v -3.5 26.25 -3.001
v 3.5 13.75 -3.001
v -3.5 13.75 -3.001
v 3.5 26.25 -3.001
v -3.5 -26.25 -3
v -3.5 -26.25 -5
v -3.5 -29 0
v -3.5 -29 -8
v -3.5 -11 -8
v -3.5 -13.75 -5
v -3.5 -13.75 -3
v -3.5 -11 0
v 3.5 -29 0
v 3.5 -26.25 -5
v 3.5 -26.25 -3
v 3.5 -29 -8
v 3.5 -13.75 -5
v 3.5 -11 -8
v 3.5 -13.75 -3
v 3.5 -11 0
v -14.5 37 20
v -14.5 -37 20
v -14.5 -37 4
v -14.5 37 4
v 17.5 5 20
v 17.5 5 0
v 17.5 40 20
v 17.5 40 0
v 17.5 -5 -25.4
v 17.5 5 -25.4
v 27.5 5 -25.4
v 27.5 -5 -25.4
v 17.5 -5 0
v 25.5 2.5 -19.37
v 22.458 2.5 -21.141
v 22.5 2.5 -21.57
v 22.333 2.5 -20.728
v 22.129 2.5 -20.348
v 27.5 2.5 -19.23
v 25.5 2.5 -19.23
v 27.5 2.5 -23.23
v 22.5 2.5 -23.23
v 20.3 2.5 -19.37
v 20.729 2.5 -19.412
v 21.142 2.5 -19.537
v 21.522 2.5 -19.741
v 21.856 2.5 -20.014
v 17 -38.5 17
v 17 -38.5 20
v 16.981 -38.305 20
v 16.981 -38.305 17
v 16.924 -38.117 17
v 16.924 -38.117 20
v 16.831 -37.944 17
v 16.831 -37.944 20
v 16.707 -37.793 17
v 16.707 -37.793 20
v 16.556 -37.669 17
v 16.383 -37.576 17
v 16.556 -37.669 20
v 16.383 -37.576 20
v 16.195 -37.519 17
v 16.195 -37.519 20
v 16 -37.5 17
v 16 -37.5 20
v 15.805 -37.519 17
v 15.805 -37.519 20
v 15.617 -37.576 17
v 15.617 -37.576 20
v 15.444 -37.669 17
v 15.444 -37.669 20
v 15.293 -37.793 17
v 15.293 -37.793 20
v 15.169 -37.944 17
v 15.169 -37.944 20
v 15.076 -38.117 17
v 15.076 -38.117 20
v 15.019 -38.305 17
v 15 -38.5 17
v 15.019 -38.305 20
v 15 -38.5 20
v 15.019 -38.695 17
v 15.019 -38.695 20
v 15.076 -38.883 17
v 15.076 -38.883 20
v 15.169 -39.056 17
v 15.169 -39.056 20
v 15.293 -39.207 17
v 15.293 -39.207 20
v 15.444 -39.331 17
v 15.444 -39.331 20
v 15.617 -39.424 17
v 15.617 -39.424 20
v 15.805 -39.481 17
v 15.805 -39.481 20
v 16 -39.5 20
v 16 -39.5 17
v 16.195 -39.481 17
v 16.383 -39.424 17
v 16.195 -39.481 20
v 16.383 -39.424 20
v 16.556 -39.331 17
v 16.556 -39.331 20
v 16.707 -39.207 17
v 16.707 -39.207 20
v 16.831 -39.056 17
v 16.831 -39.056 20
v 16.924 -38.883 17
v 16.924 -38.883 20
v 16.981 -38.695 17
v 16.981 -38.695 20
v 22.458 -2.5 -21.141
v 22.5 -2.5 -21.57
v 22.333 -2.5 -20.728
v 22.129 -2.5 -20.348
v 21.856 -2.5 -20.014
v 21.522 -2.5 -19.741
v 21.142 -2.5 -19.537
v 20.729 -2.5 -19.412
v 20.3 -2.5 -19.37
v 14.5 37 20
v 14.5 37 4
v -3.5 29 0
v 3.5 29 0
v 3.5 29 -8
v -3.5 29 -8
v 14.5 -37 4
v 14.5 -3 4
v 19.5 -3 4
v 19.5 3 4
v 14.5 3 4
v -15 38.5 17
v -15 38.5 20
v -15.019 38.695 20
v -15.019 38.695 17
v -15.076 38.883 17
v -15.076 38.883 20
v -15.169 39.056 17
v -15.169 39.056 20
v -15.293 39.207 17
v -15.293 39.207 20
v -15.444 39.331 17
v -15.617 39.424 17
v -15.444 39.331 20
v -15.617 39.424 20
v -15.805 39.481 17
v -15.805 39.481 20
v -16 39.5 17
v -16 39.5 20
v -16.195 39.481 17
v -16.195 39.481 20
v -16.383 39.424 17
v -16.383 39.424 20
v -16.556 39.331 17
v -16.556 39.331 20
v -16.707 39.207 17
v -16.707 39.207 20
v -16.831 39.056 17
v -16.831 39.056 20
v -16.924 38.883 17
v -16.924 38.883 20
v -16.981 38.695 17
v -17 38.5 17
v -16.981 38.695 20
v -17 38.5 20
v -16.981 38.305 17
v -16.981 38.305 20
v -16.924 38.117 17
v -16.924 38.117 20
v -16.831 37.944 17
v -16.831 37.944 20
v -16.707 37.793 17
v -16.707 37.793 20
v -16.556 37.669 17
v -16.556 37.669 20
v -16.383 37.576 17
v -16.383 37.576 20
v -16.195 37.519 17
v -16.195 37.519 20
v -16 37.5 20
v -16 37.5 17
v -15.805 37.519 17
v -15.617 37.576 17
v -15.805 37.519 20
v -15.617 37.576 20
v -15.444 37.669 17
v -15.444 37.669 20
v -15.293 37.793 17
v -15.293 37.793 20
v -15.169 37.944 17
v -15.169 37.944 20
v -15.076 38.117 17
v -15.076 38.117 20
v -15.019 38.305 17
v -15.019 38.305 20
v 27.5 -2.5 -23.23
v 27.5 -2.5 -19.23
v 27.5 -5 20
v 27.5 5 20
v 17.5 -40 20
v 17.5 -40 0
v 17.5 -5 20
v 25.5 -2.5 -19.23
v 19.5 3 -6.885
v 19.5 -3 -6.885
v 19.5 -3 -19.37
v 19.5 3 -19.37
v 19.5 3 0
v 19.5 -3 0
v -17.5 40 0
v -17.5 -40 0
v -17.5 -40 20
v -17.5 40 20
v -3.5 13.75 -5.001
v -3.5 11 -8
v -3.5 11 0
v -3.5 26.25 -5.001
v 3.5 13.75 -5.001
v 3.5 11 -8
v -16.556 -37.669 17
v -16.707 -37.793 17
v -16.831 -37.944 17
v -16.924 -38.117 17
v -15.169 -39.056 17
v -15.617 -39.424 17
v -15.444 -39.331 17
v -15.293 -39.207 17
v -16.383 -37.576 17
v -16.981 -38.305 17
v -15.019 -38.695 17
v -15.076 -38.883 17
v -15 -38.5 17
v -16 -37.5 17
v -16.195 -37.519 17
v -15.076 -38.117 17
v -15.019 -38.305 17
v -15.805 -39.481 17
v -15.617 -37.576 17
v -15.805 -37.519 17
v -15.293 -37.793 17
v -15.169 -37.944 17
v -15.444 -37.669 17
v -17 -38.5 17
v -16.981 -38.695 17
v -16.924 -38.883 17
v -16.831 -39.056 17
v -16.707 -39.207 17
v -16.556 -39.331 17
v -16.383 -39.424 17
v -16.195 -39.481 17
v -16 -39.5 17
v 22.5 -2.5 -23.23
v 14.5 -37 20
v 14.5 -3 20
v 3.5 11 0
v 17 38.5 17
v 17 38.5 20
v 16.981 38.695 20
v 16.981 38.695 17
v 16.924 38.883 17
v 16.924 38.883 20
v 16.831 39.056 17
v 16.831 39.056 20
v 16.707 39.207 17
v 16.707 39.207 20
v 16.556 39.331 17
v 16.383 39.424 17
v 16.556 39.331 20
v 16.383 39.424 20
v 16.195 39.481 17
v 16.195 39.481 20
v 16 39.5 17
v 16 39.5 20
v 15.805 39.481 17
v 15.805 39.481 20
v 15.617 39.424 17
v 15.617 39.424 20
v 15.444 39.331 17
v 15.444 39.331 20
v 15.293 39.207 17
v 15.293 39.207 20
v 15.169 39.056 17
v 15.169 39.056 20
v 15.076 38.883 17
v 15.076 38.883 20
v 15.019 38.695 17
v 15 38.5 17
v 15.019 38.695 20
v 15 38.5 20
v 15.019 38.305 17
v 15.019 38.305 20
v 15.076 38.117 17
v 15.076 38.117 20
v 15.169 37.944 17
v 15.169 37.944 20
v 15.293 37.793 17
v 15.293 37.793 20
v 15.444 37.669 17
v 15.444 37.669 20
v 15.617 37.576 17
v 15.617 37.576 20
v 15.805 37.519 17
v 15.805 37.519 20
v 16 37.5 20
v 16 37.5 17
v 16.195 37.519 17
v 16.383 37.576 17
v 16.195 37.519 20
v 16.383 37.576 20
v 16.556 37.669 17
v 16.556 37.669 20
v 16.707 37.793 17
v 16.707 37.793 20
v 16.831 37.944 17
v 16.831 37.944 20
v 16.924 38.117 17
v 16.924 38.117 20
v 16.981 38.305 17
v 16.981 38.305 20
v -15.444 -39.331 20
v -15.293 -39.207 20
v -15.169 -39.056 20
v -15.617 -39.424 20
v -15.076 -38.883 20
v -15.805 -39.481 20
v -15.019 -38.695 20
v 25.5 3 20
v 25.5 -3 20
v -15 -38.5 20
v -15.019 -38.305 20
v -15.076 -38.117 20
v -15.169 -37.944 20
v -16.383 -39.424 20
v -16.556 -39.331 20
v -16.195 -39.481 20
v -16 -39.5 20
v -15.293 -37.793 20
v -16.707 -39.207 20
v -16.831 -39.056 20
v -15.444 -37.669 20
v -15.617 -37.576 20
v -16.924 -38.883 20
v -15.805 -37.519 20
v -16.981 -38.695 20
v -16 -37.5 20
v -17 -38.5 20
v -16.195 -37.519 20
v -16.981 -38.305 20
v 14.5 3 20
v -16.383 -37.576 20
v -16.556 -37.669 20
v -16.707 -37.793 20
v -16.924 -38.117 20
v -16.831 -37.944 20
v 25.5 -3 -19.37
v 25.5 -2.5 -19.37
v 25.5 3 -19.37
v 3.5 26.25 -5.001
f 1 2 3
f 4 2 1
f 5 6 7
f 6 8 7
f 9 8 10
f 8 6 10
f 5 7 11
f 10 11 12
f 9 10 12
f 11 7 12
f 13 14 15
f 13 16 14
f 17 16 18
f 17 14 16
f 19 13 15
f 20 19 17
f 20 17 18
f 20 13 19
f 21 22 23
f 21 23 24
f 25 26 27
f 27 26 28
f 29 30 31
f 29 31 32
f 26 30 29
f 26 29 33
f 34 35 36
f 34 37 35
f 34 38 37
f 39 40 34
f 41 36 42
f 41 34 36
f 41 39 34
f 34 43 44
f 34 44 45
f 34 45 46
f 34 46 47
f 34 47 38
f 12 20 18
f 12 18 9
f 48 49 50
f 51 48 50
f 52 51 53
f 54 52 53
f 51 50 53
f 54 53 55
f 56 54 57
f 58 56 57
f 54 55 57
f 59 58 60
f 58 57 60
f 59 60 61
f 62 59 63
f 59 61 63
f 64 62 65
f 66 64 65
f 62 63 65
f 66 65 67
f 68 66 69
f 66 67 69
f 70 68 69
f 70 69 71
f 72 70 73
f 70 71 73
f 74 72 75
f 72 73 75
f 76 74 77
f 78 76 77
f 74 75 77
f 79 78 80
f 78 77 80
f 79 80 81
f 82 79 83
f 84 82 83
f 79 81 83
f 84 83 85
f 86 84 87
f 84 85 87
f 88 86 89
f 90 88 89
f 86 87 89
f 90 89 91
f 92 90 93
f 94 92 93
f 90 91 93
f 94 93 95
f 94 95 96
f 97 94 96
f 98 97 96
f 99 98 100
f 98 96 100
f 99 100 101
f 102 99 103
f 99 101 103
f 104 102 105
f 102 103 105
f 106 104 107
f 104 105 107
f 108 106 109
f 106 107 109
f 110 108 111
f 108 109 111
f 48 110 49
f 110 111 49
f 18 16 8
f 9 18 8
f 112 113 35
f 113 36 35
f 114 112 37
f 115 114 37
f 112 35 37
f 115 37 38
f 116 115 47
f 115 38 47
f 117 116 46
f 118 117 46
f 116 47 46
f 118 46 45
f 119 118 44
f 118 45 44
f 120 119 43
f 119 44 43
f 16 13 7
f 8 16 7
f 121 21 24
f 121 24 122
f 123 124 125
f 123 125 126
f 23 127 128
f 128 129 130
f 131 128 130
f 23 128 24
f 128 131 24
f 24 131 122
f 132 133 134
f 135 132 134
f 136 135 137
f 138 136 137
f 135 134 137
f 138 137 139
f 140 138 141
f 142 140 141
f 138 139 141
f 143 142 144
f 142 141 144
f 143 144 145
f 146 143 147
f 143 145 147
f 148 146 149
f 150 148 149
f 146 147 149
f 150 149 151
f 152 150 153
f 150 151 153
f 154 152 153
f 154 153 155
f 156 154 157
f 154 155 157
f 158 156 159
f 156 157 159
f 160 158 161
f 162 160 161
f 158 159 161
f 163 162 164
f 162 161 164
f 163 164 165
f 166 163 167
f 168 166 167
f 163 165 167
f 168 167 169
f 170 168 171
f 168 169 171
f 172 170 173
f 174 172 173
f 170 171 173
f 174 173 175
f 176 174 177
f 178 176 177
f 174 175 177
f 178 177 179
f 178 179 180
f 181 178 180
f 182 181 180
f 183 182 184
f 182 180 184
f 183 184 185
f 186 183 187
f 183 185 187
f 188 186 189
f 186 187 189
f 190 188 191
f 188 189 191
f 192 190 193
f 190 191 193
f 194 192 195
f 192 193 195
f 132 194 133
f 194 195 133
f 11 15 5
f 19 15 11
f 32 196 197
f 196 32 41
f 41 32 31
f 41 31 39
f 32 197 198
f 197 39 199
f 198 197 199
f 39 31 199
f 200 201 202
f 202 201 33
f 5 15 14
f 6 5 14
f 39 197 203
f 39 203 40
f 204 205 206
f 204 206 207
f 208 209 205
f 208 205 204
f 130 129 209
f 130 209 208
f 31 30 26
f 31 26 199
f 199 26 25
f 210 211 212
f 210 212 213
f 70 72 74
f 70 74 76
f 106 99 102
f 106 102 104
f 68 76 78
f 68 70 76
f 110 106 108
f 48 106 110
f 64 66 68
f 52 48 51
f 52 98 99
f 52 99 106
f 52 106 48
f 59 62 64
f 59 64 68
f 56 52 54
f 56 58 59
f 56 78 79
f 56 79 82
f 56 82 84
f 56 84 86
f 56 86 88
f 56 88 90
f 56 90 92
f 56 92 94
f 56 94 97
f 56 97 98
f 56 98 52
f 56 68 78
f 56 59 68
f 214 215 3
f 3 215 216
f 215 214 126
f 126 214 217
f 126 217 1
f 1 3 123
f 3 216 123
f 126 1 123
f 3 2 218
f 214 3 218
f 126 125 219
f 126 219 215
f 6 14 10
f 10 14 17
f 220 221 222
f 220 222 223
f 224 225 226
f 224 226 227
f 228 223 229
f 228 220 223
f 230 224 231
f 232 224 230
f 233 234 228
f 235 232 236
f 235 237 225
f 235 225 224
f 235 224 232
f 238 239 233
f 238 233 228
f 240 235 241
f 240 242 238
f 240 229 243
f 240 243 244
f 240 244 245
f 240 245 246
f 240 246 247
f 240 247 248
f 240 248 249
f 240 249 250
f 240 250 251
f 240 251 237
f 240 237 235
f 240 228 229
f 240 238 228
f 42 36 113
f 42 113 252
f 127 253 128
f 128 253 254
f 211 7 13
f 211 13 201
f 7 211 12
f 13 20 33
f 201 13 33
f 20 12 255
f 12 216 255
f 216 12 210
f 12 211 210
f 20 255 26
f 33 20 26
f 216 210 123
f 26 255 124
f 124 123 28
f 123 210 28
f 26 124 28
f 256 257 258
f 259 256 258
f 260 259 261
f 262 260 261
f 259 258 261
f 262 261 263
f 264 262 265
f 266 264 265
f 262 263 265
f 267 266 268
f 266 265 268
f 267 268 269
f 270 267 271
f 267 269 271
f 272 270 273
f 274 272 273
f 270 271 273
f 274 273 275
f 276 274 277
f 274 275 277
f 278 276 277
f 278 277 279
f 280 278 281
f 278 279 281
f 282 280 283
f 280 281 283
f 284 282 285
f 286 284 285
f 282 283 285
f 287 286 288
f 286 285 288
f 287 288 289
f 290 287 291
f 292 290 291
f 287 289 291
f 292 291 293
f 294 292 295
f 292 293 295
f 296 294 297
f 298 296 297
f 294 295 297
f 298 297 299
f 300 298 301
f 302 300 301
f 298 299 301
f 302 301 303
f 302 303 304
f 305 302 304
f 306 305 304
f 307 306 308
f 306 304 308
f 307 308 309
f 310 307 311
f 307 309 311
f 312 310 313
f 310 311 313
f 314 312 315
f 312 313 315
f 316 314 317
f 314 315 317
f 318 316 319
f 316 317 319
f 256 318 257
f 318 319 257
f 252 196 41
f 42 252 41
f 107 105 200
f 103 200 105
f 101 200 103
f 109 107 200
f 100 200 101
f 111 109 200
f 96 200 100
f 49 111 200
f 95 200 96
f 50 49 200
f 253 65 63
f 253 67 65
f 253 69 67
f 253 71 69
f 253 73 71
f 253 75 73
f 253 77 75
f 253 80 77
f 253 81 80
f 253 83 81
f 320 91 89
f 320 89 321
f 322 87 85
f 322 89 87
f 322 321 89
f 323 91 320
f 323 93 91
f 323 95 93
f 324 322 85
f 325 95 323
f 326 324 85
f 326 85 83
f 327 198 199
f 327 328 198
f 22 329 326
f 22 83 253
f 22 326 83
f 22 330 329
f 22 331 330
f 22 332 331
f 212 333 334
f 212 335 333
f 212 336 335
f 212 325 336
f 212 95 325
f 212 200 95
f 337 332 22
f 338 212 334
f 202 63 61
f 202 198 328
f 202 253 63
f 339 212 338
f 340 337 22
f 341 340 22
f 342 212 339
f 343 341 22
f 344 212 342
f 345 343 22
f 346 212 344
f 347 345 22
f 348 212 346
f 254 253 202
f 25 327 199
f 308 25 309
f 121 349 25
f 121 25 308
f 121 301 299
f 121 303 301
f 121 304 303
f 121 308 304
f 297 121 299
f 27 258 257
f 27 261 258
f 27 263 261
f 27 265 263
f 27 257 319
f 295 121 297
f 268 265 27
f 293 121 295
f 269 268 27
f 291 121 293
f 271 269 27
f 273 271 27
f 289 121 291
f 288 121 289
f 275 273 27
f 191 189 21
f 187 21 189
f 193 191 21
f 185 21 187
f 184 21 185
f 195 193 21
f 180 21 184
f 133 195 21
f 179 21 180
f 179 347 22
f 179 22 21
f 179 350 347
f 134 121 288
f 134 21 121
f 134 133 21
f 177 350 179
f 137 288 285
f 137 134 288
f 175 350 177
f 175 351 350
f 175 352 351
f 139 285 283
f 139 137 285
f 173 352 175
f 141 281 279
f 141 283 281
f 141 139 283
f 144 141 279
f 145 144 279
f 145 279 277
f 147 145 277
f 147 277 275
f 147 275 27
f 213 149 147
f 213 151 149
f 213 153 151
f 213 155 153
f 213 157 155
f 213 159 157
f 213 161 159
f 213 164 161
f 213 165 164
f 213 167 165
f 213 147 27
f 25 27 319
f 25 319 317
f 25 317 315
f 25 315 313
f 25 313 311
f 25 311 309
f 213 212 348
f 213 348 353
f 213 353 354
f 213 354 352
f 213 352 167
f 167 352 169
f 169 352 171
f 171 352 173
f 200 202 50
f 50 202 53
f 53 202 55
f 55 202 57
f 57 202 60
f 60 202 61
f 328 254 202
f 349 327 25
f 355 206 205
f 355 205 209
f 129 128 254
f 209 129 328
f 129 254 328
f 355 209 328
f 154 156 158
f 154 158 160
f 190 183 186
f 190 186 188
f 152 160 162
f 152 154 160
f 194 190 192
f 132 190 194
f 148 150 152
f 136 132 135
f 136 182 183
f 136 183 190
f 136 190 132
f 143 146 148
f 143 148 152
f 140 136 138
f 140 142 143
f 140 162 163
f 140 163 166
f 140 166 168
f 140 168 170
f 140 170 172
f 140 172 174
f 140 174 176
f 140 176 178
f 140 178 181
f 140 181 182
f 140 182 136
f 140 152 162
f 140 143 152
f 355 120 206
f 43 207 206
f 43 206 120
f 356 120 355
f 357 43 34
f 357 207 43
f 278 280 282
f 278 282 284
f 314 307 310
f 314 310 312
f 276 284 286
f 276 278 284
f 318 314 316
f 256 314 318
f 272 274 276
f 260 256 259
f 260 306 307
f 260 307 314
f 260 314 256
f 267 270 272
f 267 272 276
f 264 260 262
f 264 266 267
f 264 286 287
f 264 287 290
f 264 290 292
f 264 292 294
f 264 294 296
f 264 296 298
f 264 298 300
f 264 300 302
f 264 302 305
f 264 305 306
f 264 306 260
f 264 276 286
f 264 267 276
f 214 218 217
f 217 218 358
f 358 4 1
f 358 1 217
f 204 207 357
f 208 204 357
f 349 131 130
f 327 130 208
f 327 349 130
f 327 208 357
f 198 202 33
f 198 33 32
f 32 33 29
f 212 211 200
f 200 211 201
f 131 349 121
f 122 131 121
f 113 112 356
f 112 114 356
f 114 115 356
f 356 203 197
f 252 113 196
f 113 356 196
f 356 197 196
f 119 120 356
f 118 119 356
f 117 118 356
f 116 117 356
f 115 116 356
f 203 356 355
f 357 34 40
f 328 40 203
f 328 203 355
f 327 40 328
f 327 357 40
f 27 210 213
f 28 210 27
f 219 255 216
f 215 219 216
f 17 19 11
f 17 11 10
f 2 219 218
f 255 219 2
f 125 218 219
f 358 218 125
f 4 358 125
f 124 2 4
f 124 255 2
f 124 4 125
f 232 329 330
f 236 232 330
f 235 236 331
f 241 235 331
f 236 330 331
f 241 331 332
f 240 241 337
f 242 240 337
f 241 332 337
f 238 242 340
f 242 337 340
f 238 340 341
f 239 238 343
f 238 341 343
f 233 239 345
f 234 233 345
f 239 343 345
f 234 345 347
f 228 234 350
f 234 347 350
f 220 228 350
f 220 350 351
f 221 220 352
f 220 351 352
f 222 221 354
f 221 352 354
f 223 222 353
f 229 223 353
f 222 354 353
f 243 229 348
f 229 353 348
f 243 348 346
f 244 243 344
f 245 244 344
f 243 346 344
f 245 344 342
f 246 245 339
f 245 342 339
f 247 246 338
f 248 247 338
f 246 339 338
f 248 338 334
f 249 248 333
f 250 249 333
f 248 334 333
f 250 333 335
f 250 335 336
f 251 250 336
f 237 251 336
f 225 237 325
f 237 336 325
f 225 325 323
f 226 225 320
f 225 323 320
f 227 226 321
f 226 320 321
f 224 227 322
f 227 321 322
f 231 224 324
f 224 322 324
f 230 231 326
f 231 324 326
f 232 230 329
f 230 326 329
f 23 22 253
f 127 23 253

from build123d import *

# Parameters (mm, degrees)
SKETCH1_W           = 35
SKETCH1_H           = 80
BOSS_EXTRUDE1_DEPTH = 20
BOSS_EXTRUDE2_DEPTH = 10
SKETCH3_W           = 6
SKETCH3_H           = 6
CUT_EXTRUDE2_DEPTH  = 39.37
SKETCH6_W           = 4
SKETCH6_H           = 5
CUT_EXTRUDE4_DEPTH  = 5
SKETCH7_W           = 29
SKETCH7_H           = 74
CUT_EXTRUDE5_DEPTH  = 16
SKETCH11_W          = 12.542842321
SKETCH11_H          = 6
CUT_EXTRUDE8_DEPTH  = 16
BOSS_EXTRUDE3_DEPTH = 10
FILLET5_R           = 2.2
SKETCH13_W          = 7
SKETCH13_H          = 18
BOSS_EXTRUDE4_DEPTH = 8
SKETCH14_W          = 2
SKETCH14_H          = 12.5
CUT_EXTRUDE9_DEPTH  = 54.114593098
SKETCH15_W          = 2
SKETCH15_H          = 12.5
CUT_EXTRUDE10_DEPTH = 54.114593098
SKETCH16_W          = 16
SKETCH16_H          = 6
CUT_EXTRUDE11_DEPTH = 10
SKETCH17_W          = 16
SKETCH17_H          = 6
BOSS_EXTRUDE5_DEPTH = 2
SKETCH18_W          = 6
SKETCH18_H          = 6
CUT_EXTRUDE12_DEPTH = 19
SKETCH19_R          = 1
CUT_EXTRUDE13_DEPTH = 3


with BuildPart() as part:
    # Sketch1 → Boss-Extrude1 (new body)
    with BuildSketch(Plane.XY):
        Rectangle(SKETCH1_W, SKETCH1_H)
    extrude(amount=BOSS_EXTRUDE1_DEPTH)

    # Sketch7 → Cut-Extrude5 (cut)
    with BuildSketch(Plane.XY.offset(20)):
        Rectangle(SKETCH7_W, SKETCH7_H)
    extrude(amount=-CUT_EXTRUDE5_DEPTH, mode=Mode.SUBTRACT)



with BuildPart() as body_2:
    # Sketch2 → Boss-Extrude2 (new body)
    with BuildSketch(Plane(origin=(17.5, 0, 0), x_dir=(0, 0, -1), z_dir=(1, 0, 0))):
        Polygon((0, 5), (25.4, 5), (25.4, -5), (0, -5), (-20, -5), (-20, 5), align=None)
    extrude(amount=BOSS_EXTRUDE2_DEPTH)

    # Sketch3 → Cut-Extrude2 (cut)
    with BuildSketch(Plane.XY.offset(20)):
        with Locations((22.5, 0)):
            Rectangle(SKETCH3_W, SKETCH3_H)
    extrude(amount=-CUT_EXTRUDE2_DEPTH, mode=Mode.SUBTRACT)

    # Sketch6 → Cut-Extrude4 (cut)
    with BuildSketch(Plane(origin=(27.5, 0, 0), x_dir=(0, 0, -1), z_dir=(1, 0, 0))):
        with Locations((21.230369208, 0)):
            Rectangle(SKETCH6_W, SKETCH6_H)
    extrude(amount=-CUT_EXTRUDE4_DEPTH, mode=Mode.SUBTRACT)

    # Sketch11 → Cut-Extrude8 (cut)
    with BuildSketch(Plane.XY.offset(20)):
        with Locations((25.771421161, 0)):
            Rectangle(SKETCH11_W, SKETCH11_H)
    extrude(amount=-CUT_EXTRUDE8_DEPTH, mode=Mode.SUBTRACT)


with BuildPart() as part_1:
    add(part.part)

    add(body_2.part)  # Boss-Extrude3 merges body 2
    # Sketch12 → Boss-Extrude3 (add)
    with BuildSketch(Plane.XZ.offset(5)):
        with BuildLine():
            Line((26.553770823, 0), (17.5, 0))
            Line((17.5, 0), (17.5, -4.56807309))
            ThreePointArc((17.5, -4.56807309), (24.455433698, -7.097339482), (26.553770823, 0))
        make_face()
    extrude(amount=-BOSS_EXTRUDE3_DEPTH)

    # Fillet5
    fillet5_edges = [part_1.edges().sort_by_distance(p)[0] for p in [
        (22.5, 0, -19.37),
    ]]
    fillet(fillet5_edges, radius=FILLET5_R)

    # Sketch13 → Boss-Extrude4 (add)
    with BuildSketch(Plane(origin=(0, 0, 0), x_dir=(-1, 0, 0), z_dir=(0, 0, -1))):
        with Locations((0, 20)):
            Rectangle(SKETCH13_W, SKETCH13_H)
        with Locations((0, -20)):
            Rectangle(SKETCH13_W, SKETCH13_H)
    extrude(amount=BOSS_EXTRUDE4_DEPTH)

    # Sketch14 → Cut-Extrude9 (cut, through all)
    with BuildSketch(Plane(origin=(3.5, 0, 0), x_dir=(0, 0, -1), z_dir=(1, 0, 0))):
        with Locations((4.000507047, 20.000395676)):
            Rectangle(SKETCH14_W, SKETCH14_H)
    extrude(amount=-CUT_EXTRUDE9_DEPTH, mode=Mode.SUBTRACT)

    # Sketch15 → Cut-Extrude10 (cut, through all)
    with BuildSketch(Plane(origin=(3.5, 0, 0), x_dir=(0, 0, -1), z_dir=(1, 0, 0))):
        with Locations((3.99995913, -20.00010798)):
            Rectangle(SKETCH15_W, SKETCH15_H)
    extrude(amount=-CUT_EXTRUDE10_DEPTH, mode=Mode.SUBTRACT)

    # Sketch16 → Cut-Extrude11 (cut)
    with BuildSketch(Plane(origin=(19.5, 0, 0), x_dir=(0, 0, -1), z_dir=(1, 0, 0))):
        with Locations((-12, 0)):
            Rectangle(SKETCH16_W, SKETCH16_H)
    extrude(amount=-CUT_EXTRUDE11_DEPTH, mode=Mode.SUBTRACT)

    # Sketch17 → Boss-Extrude5 (add)
    with BuildSketch(Plane.ZY.offset(-25.5)):
        with Locations((12, 0)):
            Rectangle(SKETCH17_W, SKETCH17_H)
    extrude(amount=-BOSS_EXTRUDE5_DEPTH)

    # Sketch18 → Cut-Extrude12 (cut)
    with BuildSketch(Plane.XY):
        with Locations((22.5, 0)):
            Rectangle(SKETCH18_W, SKETCH18_H)
    extrude(amount=-CUT_EXTRUDE12_DEPTH, mode=Mode.SUBTRACT)

    # Sketch19 → Cut-Extrude13 (cut)
    with BuildSketch(Plane.XY.offset(20)):
        with Locations((16, 38.5)):
            Circle(SKETCH19_R)
        with Locations((-16, 38.5)):
            Circle(SKETCH19_R)
        with Locations((16, -38.5)):
            Circle(SKETCH19_R)
        with Locations((-16, -38.5)):
            Circle(SKETCH19_R)
    extrude(amount=-CUT_EXTRUDE13_DEPTH, mode=Mode.SUBTRACT)


solid = part_1.part
